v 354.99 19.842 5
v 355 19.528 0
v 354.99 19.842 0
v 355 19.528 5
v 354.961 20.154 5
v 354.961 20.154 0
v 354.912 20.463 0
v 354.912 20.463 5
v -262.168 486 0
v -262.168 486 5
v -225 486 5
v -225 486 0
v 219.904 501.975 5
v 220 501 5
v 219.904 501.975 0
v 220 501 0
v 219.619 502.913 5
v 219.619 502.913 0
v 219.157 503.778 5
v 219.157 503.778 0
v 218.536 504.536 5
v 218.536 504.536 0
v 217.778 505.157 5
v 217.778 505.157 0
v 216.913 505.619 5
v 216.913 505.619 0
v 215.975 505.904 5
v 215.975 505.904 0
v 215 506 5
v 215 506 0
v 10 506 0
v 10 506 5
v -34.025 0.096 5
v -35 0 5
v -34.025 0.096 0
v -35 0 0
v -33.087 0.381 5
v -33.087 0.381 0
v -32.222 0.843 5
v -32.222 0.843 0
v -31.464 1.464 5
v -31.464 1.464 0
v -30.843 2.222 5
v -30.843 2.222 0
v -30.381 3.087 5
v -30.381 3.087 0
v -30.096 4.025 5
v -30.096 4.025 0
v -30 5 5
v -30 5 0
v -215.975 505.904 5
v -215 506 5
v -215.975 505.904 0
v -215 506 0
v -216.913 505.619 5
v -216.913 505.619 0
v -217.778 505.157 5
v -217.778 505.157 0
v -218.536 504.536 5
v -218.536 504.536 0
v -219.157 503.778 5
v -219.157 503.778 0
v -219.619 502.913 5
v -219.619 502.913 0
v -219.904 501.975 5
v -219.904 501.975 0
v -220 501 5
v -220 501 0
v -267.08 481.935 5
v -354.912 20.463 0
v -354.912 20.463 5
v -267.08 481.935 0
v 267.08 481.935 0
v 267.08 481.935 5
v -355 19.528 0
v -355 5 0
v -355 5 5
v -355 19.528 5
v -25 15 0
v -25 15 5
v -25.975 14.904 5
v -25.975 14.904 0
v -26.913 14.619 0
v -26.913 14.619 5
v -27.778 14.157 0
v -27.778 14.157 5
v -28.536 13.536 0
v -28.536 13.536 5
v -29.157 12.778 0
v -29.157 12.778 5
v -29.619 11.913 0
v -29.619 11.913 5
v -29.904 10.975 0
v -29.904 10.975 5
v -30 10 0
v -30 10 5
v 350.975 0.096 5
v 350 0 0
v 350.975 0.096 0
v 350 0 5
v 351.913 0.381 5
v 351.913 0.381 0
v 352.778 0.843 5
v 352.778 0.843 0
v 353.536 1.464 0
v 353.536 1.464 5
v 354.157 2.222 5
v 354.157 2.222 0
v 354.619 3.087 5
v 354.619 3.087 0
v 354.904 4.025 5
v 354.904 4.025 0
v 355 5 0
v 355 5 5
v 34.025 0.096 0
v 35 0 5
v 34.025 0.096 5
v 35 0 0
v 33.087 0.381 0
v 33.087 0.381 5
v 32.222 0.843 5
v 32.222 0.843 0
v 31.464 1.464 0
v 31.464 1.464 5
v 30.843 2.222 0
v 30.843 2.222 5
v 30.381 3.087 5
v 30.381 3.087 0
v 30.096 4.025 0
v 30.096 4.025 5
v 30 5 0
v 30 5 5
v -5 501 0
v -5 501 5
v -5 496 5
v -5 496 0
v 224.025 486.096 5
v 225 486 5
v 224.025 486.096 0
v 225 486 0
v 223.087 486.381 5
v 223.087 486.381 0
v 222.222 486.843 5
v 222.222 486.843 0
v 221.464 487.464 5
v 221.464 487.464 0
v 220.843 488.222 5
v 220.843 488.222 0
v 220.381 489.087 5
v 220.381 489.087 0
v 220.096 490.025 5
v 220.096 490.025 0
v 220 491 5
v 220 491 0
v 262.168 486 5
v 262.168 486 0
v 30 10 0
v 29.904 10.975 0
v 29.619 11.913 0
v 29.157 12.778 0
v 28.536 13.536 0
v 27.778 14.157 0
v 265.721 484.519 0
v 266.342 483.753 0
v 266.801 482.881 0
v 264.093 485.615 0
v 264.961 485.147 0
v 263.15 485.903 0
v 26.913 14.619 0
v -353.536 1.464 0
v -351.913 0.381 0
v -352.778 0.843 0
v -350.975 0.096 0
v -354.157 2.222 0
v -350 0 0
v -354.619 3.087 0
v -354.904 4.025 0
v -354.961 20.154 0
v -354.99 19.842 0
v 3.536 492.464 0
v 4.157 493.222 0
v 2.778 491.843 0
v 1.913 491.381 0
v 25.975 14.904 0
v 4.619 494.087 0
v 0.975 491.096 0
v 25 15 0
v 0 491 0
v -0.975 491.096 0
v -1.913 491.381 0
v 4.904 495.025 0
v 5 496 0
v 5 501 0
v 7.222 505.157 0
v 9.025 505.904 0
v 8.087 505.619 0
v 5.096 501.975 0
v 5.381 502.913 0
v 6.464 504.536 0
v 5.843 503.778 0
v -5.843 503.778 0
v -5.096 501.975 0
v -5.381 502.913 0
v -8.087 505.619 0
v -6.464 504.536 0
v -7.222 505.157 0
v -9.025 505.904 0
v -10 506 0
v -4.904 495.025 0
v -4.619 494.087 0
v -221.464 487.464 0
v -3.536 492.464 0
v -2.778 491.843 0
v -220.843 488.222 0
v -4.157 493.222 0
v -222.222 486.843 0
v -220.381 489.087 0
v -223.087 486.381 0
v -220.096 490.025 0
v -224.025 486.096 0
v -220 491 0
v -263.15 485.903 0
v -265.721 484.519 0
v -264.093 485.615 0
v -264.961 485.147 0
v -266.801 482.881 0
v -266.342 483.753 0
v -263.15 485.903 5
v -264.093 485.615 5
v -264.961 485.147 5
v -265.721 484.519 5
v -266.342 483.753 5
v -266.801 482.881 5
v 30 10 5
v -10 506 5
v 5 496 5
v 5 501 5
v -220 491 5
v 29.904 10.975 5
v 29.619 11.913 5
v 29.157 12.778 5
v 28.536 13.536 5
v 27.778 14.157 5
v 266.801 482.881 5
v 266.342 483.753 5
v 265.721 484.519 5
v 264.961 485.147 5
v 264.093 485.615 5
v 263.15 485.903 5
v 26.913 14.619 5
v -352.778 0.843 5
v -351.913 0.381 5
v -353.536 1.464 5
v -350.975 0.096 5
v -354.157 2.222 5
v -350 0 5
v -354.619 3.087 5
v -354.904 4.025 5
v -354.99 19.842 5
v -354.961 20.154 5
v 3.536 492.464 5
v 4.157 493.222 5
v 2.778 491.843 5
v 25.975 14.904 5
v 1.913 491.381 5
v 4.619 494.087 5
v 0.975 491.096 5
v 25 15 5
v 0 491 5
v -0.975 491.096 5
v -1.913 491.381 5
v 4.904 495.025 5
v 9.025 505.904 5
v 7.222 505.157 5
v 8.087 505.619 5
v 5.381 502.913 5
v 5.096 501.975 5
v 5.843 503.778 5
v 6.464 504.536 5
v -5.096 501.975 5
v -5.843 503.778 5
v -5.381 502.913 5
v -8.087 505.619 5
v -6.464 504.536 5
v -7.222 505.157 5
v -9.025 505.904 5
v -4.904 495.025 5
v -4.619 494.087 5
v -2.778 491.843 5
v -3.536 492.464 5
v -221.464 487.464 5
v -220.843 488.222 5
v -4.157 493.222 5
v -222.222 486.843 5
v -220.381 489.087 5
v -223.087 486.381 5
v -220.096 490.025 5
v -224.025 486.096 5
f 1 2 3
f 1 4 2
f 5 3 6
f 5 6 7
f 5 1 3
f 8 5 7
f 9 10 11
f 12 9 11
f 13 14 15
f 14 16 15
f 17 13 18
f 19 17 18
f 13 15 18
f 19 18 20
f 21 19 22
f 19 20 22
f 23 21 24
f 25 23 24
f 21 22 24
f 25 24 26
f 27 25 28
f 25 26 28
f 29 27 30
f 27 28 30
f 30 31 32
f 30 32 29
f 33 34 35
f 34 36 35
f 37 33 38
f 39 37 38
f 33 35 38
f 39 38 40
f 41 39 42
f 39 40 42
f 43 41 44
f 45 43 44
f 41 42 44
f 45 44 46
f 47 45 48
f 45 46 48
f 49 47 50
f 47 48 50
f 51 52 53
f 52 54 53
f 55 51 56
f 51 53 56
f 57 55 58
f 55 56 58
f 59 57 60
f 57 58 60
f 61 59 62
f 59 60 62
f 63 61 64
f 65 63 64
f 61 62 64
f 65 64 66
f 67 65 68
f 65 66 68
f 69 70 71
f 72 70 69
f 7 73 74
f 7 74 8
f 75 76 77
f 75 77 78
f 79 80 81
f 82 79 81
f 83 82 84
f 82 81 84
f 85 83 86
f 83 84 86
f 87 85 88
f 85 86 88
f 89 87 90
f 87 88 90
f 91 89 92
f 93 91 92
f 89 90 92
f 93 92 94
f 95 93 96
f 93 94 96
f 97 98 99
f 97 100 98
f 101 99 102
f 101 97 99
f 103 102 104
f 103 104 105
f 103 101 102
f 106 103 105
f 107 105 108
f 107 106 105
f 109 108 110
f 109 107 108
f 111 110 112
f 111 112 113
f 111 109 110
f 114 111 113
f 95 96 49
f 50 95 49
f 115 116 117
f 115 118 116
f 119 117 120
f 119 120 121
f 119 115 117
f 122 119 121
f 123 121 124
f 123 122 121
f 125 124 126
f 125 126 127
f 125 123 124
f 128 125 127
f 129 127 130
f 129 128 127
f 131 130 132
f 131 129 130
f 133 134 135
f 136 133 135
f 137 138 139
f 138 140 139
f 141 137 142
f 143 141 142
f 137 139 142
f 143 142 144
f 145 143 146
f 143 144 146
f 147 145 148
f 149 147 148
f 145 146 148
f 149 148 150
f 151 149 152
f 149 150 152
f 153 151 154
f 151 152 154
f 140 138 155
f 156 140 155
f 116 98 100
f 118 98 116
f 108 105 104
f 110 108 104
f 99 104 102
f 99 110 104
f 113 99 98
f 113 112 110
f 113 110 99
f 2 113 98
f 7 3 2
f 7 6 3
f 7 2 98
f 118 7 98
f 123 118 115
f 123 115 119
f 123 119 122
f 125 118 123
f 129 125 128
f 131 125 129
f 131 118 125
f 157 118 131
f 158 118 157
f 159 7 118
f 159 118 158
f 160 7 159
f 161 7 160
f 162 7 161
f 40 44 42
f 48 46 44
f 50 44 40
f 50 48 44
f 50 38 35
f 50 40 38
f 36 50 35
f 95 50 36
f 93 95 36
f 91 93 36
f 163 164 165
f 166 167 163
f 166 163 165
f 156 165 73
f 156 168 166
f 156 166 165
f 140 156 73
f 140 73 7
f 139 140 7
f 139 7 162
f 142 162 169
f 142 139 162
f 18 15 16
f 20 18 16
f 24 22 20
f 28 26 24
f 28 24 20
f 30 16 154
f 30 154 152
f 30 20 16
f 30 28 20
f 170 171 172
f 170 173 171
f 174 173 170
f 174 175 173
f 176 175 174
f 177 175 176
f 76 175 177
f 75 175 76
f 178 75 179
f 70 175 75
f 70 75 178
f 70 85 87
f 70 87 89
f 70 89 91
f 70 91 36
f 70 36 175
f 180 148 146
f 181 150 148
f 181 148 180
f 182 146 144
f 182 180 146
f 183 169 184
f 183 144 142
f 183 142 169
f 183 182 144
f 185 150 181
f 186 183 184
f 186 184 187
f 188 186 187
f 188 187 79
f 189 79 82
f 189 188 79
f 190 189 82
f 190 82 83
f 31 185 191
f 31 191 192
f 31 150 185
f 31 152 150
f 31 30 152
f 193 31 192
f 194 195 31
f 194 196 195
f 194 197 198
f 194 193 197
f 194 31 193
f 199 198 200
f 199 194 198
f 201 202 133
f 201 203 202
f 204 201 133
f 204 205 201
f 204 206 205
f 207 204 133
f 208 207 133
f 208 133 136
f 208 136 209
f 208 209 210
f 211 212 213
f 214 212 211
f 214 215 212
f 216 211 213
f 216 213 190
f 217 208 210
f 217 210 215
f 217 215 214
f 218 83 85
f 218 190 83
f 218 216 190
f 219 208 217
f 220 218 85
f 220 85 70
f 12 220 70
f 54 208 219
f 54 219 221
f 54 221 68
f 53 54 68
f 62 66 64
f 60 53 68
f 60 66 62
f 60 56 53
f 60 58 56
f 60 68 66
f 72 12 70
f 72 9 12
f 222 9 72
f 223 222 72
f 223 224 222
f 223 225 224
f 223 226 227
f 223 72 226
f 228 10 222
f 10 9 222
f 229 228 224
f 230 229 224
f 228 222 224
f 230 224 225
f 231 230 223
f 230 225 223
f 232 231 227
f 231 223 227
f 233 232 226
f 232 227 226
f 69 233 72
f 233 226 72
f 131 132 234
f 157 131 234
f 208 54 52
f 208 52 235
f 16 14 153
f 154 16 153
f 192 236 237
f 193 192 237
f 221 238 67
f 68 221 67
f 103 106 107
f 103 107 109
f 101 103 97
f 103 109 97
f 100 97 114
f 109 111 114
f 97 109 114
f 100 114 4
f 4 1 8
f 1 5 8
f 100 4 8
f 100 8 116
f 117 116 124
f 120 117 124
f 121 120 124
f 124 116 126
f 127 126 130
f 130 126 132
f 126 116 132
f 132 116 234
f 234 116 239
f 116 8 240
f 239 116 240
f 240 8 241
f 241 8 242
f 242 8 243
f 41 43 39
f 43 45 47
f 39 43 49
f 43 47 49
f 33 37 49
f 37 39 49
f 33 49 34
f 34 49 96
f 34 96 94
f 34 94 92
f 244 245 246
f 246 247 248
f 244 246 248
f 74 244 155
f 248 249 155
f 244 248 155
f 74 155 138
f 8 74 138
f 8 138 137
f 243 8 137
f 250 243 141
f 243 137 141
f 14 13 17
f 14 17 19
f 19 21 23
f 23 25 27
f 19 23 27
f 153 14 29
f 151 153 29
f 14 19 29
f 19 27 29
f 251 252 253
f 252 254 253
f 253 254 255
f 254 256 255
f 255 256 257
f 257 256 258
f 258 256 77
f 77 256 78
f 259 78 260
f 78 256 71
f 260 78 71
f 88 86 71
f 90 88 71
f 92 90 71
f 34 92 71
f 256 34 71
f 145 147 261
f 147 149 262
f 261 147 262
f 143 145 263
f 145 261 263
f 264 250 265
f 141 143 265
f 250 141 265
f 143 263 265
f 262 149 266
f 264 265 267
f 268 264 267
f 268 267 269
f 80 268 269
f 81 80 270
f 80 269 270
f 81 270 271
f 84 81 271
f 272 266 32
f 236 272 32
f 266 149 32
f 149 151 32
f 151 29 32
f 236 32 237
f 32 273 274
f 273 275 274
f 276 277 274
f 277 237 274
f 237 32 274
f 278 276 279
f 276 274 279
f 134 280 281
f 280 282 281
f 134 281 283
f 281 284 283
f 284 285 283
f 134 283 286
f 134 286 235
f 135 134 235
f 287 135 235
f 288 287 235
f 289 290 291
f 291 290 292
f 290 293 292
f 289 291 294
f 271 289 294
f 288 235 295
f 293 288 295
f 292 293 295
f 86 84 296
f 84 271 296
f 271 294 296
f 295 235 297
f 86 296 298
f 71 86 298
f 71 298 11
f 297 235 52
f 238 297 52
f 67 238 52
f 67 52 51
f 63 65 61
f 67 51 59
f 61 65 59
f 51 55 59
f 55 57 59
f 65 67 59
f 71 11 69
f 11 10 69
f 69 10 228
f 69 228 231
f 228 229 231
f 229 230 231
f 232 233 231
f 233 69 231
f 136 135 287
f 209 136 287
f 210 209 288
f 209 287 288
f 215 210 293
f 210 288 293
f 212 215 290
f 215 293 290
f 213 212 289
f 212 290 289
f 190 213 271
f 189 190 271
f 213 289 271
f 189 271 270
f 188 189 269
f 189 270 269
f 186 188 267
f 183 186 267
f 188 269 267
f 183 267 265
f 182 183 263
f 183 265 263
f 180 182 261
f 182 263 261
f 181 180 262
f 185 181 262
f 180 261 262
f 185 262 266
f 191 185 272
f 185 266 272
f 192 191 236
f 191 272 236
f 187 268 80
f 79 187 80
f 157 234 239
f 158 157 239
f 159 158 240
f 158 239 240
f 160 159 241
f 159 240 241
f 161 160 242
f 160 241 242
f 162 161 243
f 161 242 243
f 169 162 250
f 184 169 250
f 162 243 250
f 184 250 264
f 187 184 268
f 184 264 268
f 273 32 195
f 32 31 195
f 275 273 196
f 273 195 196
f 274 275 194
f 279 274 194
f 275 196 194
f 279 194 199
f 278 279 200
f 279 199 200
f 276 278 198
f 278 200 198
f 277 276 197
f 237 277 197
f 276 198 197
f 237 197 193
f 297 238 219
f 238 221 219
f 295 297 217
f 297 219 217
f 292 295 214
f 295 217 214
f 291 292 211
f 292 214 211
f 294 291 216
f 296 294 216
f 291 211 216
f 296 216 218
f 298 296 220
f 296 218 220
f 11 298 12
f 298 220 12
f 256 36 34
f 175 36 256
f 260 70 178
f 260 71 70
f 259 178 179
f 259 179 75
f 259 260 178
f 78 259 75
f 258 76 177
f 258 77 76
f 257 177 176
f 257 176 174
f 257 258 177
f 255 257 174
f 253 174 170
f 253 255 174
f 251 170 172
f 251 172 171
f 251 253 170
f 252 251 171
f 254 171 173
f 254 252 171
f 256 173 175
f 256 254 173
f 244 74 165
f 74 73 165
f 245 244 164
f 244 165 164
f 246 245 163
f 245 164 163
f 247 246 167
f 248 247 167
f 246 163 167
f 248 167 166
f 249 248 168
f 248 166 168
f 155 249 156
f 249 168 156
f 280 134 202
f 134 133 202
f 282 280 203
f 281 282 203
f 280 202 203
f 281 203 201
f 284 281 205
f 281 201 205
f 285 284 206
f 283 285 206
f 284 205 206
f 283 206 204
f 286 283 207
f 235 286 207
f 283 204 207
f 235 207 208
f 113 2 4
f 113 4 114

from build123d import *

# Parameters (mm, degrees)
EXTRUDE_1_DEPTH     = 5
CUT_EXTRUDE_1_DEPTH = 619.131054065
FILLET_1_R          = 5


with BuildPart() as part:
    # ｽｹｯﾁ2 → ﾎﾞｽ - 押し出し1 (new body)
    with BuildSketch(Plane.XY):
        Polygon((355, 0), (-355, 0), (-355, 20), (-262.5, 506), (262.5, 506), (355, 20), align=None)
    extrude(amount=EXTRUDE_1_DEPTH)

    # ｽｹｯﾁ3 → ｶｯﾄ - 押し出し1 (cut, through all)
    with BuildSketch(Plane.XY.offset(5)):
        Polygon((-262.5, 506), (-266.306584362, 486), (-220, 486), (-220, 506), align=None)
        Polygon((262.5, 506), (220, 506), (220, 486), (266.306584362, 486), align=None)
        with BuildLine():
            Line((5, 506), (-5, 506))
            Line((-5, 506), (-5, 496))
            ThreePointArc((-5, 496), (0, 491), (5, 496))
            Line((5, 496), (5, 506))
        make_face()
        with BuildLine():
            Line((-30, 10), (-30, 0))
            Line((-30, 0), (30, 0))
            Line((30, 0), (30, 10))
            ThreePointArc((30, 10), (28.535533906, 13.535533906), (25, 15))
            Line((25, 15), (-25, 15))
            ThreePointArc((-25, 15), (-28.535533906, 13.535533906), (-30, 10))
        make_face()
    extrude(amount=-CUT_EXTRUDE_1_DEPTH, mode=Mode.SUBTRACT)

    # ﾌｨﾚｯﾄ1
    fillet_1_edges = [part.edges().sort_by_distance(p)[0] for p in [
        (-355, 20, 2.5),
        (355, 20, 2.5),
        (355, 0, 2.5),
        (-355, 0, 2.5),
        (-220, 486, 2.5),
        (-266.306584362, 486, 2.5),
        (-220, 506, 2.5),
        (266.306584362, 486, 2.5),
        (220, 486, 2.5),
        (220, 506, 2.5),
        (-5, 506, 2.5),
        (5, 506, 2.5),
        (30, 0, 2.5),
        (-30, 0, 2.5),
    ]]
    fillet(fillet_1_edges, radius=FILLET_1_R)


solid = part.part
